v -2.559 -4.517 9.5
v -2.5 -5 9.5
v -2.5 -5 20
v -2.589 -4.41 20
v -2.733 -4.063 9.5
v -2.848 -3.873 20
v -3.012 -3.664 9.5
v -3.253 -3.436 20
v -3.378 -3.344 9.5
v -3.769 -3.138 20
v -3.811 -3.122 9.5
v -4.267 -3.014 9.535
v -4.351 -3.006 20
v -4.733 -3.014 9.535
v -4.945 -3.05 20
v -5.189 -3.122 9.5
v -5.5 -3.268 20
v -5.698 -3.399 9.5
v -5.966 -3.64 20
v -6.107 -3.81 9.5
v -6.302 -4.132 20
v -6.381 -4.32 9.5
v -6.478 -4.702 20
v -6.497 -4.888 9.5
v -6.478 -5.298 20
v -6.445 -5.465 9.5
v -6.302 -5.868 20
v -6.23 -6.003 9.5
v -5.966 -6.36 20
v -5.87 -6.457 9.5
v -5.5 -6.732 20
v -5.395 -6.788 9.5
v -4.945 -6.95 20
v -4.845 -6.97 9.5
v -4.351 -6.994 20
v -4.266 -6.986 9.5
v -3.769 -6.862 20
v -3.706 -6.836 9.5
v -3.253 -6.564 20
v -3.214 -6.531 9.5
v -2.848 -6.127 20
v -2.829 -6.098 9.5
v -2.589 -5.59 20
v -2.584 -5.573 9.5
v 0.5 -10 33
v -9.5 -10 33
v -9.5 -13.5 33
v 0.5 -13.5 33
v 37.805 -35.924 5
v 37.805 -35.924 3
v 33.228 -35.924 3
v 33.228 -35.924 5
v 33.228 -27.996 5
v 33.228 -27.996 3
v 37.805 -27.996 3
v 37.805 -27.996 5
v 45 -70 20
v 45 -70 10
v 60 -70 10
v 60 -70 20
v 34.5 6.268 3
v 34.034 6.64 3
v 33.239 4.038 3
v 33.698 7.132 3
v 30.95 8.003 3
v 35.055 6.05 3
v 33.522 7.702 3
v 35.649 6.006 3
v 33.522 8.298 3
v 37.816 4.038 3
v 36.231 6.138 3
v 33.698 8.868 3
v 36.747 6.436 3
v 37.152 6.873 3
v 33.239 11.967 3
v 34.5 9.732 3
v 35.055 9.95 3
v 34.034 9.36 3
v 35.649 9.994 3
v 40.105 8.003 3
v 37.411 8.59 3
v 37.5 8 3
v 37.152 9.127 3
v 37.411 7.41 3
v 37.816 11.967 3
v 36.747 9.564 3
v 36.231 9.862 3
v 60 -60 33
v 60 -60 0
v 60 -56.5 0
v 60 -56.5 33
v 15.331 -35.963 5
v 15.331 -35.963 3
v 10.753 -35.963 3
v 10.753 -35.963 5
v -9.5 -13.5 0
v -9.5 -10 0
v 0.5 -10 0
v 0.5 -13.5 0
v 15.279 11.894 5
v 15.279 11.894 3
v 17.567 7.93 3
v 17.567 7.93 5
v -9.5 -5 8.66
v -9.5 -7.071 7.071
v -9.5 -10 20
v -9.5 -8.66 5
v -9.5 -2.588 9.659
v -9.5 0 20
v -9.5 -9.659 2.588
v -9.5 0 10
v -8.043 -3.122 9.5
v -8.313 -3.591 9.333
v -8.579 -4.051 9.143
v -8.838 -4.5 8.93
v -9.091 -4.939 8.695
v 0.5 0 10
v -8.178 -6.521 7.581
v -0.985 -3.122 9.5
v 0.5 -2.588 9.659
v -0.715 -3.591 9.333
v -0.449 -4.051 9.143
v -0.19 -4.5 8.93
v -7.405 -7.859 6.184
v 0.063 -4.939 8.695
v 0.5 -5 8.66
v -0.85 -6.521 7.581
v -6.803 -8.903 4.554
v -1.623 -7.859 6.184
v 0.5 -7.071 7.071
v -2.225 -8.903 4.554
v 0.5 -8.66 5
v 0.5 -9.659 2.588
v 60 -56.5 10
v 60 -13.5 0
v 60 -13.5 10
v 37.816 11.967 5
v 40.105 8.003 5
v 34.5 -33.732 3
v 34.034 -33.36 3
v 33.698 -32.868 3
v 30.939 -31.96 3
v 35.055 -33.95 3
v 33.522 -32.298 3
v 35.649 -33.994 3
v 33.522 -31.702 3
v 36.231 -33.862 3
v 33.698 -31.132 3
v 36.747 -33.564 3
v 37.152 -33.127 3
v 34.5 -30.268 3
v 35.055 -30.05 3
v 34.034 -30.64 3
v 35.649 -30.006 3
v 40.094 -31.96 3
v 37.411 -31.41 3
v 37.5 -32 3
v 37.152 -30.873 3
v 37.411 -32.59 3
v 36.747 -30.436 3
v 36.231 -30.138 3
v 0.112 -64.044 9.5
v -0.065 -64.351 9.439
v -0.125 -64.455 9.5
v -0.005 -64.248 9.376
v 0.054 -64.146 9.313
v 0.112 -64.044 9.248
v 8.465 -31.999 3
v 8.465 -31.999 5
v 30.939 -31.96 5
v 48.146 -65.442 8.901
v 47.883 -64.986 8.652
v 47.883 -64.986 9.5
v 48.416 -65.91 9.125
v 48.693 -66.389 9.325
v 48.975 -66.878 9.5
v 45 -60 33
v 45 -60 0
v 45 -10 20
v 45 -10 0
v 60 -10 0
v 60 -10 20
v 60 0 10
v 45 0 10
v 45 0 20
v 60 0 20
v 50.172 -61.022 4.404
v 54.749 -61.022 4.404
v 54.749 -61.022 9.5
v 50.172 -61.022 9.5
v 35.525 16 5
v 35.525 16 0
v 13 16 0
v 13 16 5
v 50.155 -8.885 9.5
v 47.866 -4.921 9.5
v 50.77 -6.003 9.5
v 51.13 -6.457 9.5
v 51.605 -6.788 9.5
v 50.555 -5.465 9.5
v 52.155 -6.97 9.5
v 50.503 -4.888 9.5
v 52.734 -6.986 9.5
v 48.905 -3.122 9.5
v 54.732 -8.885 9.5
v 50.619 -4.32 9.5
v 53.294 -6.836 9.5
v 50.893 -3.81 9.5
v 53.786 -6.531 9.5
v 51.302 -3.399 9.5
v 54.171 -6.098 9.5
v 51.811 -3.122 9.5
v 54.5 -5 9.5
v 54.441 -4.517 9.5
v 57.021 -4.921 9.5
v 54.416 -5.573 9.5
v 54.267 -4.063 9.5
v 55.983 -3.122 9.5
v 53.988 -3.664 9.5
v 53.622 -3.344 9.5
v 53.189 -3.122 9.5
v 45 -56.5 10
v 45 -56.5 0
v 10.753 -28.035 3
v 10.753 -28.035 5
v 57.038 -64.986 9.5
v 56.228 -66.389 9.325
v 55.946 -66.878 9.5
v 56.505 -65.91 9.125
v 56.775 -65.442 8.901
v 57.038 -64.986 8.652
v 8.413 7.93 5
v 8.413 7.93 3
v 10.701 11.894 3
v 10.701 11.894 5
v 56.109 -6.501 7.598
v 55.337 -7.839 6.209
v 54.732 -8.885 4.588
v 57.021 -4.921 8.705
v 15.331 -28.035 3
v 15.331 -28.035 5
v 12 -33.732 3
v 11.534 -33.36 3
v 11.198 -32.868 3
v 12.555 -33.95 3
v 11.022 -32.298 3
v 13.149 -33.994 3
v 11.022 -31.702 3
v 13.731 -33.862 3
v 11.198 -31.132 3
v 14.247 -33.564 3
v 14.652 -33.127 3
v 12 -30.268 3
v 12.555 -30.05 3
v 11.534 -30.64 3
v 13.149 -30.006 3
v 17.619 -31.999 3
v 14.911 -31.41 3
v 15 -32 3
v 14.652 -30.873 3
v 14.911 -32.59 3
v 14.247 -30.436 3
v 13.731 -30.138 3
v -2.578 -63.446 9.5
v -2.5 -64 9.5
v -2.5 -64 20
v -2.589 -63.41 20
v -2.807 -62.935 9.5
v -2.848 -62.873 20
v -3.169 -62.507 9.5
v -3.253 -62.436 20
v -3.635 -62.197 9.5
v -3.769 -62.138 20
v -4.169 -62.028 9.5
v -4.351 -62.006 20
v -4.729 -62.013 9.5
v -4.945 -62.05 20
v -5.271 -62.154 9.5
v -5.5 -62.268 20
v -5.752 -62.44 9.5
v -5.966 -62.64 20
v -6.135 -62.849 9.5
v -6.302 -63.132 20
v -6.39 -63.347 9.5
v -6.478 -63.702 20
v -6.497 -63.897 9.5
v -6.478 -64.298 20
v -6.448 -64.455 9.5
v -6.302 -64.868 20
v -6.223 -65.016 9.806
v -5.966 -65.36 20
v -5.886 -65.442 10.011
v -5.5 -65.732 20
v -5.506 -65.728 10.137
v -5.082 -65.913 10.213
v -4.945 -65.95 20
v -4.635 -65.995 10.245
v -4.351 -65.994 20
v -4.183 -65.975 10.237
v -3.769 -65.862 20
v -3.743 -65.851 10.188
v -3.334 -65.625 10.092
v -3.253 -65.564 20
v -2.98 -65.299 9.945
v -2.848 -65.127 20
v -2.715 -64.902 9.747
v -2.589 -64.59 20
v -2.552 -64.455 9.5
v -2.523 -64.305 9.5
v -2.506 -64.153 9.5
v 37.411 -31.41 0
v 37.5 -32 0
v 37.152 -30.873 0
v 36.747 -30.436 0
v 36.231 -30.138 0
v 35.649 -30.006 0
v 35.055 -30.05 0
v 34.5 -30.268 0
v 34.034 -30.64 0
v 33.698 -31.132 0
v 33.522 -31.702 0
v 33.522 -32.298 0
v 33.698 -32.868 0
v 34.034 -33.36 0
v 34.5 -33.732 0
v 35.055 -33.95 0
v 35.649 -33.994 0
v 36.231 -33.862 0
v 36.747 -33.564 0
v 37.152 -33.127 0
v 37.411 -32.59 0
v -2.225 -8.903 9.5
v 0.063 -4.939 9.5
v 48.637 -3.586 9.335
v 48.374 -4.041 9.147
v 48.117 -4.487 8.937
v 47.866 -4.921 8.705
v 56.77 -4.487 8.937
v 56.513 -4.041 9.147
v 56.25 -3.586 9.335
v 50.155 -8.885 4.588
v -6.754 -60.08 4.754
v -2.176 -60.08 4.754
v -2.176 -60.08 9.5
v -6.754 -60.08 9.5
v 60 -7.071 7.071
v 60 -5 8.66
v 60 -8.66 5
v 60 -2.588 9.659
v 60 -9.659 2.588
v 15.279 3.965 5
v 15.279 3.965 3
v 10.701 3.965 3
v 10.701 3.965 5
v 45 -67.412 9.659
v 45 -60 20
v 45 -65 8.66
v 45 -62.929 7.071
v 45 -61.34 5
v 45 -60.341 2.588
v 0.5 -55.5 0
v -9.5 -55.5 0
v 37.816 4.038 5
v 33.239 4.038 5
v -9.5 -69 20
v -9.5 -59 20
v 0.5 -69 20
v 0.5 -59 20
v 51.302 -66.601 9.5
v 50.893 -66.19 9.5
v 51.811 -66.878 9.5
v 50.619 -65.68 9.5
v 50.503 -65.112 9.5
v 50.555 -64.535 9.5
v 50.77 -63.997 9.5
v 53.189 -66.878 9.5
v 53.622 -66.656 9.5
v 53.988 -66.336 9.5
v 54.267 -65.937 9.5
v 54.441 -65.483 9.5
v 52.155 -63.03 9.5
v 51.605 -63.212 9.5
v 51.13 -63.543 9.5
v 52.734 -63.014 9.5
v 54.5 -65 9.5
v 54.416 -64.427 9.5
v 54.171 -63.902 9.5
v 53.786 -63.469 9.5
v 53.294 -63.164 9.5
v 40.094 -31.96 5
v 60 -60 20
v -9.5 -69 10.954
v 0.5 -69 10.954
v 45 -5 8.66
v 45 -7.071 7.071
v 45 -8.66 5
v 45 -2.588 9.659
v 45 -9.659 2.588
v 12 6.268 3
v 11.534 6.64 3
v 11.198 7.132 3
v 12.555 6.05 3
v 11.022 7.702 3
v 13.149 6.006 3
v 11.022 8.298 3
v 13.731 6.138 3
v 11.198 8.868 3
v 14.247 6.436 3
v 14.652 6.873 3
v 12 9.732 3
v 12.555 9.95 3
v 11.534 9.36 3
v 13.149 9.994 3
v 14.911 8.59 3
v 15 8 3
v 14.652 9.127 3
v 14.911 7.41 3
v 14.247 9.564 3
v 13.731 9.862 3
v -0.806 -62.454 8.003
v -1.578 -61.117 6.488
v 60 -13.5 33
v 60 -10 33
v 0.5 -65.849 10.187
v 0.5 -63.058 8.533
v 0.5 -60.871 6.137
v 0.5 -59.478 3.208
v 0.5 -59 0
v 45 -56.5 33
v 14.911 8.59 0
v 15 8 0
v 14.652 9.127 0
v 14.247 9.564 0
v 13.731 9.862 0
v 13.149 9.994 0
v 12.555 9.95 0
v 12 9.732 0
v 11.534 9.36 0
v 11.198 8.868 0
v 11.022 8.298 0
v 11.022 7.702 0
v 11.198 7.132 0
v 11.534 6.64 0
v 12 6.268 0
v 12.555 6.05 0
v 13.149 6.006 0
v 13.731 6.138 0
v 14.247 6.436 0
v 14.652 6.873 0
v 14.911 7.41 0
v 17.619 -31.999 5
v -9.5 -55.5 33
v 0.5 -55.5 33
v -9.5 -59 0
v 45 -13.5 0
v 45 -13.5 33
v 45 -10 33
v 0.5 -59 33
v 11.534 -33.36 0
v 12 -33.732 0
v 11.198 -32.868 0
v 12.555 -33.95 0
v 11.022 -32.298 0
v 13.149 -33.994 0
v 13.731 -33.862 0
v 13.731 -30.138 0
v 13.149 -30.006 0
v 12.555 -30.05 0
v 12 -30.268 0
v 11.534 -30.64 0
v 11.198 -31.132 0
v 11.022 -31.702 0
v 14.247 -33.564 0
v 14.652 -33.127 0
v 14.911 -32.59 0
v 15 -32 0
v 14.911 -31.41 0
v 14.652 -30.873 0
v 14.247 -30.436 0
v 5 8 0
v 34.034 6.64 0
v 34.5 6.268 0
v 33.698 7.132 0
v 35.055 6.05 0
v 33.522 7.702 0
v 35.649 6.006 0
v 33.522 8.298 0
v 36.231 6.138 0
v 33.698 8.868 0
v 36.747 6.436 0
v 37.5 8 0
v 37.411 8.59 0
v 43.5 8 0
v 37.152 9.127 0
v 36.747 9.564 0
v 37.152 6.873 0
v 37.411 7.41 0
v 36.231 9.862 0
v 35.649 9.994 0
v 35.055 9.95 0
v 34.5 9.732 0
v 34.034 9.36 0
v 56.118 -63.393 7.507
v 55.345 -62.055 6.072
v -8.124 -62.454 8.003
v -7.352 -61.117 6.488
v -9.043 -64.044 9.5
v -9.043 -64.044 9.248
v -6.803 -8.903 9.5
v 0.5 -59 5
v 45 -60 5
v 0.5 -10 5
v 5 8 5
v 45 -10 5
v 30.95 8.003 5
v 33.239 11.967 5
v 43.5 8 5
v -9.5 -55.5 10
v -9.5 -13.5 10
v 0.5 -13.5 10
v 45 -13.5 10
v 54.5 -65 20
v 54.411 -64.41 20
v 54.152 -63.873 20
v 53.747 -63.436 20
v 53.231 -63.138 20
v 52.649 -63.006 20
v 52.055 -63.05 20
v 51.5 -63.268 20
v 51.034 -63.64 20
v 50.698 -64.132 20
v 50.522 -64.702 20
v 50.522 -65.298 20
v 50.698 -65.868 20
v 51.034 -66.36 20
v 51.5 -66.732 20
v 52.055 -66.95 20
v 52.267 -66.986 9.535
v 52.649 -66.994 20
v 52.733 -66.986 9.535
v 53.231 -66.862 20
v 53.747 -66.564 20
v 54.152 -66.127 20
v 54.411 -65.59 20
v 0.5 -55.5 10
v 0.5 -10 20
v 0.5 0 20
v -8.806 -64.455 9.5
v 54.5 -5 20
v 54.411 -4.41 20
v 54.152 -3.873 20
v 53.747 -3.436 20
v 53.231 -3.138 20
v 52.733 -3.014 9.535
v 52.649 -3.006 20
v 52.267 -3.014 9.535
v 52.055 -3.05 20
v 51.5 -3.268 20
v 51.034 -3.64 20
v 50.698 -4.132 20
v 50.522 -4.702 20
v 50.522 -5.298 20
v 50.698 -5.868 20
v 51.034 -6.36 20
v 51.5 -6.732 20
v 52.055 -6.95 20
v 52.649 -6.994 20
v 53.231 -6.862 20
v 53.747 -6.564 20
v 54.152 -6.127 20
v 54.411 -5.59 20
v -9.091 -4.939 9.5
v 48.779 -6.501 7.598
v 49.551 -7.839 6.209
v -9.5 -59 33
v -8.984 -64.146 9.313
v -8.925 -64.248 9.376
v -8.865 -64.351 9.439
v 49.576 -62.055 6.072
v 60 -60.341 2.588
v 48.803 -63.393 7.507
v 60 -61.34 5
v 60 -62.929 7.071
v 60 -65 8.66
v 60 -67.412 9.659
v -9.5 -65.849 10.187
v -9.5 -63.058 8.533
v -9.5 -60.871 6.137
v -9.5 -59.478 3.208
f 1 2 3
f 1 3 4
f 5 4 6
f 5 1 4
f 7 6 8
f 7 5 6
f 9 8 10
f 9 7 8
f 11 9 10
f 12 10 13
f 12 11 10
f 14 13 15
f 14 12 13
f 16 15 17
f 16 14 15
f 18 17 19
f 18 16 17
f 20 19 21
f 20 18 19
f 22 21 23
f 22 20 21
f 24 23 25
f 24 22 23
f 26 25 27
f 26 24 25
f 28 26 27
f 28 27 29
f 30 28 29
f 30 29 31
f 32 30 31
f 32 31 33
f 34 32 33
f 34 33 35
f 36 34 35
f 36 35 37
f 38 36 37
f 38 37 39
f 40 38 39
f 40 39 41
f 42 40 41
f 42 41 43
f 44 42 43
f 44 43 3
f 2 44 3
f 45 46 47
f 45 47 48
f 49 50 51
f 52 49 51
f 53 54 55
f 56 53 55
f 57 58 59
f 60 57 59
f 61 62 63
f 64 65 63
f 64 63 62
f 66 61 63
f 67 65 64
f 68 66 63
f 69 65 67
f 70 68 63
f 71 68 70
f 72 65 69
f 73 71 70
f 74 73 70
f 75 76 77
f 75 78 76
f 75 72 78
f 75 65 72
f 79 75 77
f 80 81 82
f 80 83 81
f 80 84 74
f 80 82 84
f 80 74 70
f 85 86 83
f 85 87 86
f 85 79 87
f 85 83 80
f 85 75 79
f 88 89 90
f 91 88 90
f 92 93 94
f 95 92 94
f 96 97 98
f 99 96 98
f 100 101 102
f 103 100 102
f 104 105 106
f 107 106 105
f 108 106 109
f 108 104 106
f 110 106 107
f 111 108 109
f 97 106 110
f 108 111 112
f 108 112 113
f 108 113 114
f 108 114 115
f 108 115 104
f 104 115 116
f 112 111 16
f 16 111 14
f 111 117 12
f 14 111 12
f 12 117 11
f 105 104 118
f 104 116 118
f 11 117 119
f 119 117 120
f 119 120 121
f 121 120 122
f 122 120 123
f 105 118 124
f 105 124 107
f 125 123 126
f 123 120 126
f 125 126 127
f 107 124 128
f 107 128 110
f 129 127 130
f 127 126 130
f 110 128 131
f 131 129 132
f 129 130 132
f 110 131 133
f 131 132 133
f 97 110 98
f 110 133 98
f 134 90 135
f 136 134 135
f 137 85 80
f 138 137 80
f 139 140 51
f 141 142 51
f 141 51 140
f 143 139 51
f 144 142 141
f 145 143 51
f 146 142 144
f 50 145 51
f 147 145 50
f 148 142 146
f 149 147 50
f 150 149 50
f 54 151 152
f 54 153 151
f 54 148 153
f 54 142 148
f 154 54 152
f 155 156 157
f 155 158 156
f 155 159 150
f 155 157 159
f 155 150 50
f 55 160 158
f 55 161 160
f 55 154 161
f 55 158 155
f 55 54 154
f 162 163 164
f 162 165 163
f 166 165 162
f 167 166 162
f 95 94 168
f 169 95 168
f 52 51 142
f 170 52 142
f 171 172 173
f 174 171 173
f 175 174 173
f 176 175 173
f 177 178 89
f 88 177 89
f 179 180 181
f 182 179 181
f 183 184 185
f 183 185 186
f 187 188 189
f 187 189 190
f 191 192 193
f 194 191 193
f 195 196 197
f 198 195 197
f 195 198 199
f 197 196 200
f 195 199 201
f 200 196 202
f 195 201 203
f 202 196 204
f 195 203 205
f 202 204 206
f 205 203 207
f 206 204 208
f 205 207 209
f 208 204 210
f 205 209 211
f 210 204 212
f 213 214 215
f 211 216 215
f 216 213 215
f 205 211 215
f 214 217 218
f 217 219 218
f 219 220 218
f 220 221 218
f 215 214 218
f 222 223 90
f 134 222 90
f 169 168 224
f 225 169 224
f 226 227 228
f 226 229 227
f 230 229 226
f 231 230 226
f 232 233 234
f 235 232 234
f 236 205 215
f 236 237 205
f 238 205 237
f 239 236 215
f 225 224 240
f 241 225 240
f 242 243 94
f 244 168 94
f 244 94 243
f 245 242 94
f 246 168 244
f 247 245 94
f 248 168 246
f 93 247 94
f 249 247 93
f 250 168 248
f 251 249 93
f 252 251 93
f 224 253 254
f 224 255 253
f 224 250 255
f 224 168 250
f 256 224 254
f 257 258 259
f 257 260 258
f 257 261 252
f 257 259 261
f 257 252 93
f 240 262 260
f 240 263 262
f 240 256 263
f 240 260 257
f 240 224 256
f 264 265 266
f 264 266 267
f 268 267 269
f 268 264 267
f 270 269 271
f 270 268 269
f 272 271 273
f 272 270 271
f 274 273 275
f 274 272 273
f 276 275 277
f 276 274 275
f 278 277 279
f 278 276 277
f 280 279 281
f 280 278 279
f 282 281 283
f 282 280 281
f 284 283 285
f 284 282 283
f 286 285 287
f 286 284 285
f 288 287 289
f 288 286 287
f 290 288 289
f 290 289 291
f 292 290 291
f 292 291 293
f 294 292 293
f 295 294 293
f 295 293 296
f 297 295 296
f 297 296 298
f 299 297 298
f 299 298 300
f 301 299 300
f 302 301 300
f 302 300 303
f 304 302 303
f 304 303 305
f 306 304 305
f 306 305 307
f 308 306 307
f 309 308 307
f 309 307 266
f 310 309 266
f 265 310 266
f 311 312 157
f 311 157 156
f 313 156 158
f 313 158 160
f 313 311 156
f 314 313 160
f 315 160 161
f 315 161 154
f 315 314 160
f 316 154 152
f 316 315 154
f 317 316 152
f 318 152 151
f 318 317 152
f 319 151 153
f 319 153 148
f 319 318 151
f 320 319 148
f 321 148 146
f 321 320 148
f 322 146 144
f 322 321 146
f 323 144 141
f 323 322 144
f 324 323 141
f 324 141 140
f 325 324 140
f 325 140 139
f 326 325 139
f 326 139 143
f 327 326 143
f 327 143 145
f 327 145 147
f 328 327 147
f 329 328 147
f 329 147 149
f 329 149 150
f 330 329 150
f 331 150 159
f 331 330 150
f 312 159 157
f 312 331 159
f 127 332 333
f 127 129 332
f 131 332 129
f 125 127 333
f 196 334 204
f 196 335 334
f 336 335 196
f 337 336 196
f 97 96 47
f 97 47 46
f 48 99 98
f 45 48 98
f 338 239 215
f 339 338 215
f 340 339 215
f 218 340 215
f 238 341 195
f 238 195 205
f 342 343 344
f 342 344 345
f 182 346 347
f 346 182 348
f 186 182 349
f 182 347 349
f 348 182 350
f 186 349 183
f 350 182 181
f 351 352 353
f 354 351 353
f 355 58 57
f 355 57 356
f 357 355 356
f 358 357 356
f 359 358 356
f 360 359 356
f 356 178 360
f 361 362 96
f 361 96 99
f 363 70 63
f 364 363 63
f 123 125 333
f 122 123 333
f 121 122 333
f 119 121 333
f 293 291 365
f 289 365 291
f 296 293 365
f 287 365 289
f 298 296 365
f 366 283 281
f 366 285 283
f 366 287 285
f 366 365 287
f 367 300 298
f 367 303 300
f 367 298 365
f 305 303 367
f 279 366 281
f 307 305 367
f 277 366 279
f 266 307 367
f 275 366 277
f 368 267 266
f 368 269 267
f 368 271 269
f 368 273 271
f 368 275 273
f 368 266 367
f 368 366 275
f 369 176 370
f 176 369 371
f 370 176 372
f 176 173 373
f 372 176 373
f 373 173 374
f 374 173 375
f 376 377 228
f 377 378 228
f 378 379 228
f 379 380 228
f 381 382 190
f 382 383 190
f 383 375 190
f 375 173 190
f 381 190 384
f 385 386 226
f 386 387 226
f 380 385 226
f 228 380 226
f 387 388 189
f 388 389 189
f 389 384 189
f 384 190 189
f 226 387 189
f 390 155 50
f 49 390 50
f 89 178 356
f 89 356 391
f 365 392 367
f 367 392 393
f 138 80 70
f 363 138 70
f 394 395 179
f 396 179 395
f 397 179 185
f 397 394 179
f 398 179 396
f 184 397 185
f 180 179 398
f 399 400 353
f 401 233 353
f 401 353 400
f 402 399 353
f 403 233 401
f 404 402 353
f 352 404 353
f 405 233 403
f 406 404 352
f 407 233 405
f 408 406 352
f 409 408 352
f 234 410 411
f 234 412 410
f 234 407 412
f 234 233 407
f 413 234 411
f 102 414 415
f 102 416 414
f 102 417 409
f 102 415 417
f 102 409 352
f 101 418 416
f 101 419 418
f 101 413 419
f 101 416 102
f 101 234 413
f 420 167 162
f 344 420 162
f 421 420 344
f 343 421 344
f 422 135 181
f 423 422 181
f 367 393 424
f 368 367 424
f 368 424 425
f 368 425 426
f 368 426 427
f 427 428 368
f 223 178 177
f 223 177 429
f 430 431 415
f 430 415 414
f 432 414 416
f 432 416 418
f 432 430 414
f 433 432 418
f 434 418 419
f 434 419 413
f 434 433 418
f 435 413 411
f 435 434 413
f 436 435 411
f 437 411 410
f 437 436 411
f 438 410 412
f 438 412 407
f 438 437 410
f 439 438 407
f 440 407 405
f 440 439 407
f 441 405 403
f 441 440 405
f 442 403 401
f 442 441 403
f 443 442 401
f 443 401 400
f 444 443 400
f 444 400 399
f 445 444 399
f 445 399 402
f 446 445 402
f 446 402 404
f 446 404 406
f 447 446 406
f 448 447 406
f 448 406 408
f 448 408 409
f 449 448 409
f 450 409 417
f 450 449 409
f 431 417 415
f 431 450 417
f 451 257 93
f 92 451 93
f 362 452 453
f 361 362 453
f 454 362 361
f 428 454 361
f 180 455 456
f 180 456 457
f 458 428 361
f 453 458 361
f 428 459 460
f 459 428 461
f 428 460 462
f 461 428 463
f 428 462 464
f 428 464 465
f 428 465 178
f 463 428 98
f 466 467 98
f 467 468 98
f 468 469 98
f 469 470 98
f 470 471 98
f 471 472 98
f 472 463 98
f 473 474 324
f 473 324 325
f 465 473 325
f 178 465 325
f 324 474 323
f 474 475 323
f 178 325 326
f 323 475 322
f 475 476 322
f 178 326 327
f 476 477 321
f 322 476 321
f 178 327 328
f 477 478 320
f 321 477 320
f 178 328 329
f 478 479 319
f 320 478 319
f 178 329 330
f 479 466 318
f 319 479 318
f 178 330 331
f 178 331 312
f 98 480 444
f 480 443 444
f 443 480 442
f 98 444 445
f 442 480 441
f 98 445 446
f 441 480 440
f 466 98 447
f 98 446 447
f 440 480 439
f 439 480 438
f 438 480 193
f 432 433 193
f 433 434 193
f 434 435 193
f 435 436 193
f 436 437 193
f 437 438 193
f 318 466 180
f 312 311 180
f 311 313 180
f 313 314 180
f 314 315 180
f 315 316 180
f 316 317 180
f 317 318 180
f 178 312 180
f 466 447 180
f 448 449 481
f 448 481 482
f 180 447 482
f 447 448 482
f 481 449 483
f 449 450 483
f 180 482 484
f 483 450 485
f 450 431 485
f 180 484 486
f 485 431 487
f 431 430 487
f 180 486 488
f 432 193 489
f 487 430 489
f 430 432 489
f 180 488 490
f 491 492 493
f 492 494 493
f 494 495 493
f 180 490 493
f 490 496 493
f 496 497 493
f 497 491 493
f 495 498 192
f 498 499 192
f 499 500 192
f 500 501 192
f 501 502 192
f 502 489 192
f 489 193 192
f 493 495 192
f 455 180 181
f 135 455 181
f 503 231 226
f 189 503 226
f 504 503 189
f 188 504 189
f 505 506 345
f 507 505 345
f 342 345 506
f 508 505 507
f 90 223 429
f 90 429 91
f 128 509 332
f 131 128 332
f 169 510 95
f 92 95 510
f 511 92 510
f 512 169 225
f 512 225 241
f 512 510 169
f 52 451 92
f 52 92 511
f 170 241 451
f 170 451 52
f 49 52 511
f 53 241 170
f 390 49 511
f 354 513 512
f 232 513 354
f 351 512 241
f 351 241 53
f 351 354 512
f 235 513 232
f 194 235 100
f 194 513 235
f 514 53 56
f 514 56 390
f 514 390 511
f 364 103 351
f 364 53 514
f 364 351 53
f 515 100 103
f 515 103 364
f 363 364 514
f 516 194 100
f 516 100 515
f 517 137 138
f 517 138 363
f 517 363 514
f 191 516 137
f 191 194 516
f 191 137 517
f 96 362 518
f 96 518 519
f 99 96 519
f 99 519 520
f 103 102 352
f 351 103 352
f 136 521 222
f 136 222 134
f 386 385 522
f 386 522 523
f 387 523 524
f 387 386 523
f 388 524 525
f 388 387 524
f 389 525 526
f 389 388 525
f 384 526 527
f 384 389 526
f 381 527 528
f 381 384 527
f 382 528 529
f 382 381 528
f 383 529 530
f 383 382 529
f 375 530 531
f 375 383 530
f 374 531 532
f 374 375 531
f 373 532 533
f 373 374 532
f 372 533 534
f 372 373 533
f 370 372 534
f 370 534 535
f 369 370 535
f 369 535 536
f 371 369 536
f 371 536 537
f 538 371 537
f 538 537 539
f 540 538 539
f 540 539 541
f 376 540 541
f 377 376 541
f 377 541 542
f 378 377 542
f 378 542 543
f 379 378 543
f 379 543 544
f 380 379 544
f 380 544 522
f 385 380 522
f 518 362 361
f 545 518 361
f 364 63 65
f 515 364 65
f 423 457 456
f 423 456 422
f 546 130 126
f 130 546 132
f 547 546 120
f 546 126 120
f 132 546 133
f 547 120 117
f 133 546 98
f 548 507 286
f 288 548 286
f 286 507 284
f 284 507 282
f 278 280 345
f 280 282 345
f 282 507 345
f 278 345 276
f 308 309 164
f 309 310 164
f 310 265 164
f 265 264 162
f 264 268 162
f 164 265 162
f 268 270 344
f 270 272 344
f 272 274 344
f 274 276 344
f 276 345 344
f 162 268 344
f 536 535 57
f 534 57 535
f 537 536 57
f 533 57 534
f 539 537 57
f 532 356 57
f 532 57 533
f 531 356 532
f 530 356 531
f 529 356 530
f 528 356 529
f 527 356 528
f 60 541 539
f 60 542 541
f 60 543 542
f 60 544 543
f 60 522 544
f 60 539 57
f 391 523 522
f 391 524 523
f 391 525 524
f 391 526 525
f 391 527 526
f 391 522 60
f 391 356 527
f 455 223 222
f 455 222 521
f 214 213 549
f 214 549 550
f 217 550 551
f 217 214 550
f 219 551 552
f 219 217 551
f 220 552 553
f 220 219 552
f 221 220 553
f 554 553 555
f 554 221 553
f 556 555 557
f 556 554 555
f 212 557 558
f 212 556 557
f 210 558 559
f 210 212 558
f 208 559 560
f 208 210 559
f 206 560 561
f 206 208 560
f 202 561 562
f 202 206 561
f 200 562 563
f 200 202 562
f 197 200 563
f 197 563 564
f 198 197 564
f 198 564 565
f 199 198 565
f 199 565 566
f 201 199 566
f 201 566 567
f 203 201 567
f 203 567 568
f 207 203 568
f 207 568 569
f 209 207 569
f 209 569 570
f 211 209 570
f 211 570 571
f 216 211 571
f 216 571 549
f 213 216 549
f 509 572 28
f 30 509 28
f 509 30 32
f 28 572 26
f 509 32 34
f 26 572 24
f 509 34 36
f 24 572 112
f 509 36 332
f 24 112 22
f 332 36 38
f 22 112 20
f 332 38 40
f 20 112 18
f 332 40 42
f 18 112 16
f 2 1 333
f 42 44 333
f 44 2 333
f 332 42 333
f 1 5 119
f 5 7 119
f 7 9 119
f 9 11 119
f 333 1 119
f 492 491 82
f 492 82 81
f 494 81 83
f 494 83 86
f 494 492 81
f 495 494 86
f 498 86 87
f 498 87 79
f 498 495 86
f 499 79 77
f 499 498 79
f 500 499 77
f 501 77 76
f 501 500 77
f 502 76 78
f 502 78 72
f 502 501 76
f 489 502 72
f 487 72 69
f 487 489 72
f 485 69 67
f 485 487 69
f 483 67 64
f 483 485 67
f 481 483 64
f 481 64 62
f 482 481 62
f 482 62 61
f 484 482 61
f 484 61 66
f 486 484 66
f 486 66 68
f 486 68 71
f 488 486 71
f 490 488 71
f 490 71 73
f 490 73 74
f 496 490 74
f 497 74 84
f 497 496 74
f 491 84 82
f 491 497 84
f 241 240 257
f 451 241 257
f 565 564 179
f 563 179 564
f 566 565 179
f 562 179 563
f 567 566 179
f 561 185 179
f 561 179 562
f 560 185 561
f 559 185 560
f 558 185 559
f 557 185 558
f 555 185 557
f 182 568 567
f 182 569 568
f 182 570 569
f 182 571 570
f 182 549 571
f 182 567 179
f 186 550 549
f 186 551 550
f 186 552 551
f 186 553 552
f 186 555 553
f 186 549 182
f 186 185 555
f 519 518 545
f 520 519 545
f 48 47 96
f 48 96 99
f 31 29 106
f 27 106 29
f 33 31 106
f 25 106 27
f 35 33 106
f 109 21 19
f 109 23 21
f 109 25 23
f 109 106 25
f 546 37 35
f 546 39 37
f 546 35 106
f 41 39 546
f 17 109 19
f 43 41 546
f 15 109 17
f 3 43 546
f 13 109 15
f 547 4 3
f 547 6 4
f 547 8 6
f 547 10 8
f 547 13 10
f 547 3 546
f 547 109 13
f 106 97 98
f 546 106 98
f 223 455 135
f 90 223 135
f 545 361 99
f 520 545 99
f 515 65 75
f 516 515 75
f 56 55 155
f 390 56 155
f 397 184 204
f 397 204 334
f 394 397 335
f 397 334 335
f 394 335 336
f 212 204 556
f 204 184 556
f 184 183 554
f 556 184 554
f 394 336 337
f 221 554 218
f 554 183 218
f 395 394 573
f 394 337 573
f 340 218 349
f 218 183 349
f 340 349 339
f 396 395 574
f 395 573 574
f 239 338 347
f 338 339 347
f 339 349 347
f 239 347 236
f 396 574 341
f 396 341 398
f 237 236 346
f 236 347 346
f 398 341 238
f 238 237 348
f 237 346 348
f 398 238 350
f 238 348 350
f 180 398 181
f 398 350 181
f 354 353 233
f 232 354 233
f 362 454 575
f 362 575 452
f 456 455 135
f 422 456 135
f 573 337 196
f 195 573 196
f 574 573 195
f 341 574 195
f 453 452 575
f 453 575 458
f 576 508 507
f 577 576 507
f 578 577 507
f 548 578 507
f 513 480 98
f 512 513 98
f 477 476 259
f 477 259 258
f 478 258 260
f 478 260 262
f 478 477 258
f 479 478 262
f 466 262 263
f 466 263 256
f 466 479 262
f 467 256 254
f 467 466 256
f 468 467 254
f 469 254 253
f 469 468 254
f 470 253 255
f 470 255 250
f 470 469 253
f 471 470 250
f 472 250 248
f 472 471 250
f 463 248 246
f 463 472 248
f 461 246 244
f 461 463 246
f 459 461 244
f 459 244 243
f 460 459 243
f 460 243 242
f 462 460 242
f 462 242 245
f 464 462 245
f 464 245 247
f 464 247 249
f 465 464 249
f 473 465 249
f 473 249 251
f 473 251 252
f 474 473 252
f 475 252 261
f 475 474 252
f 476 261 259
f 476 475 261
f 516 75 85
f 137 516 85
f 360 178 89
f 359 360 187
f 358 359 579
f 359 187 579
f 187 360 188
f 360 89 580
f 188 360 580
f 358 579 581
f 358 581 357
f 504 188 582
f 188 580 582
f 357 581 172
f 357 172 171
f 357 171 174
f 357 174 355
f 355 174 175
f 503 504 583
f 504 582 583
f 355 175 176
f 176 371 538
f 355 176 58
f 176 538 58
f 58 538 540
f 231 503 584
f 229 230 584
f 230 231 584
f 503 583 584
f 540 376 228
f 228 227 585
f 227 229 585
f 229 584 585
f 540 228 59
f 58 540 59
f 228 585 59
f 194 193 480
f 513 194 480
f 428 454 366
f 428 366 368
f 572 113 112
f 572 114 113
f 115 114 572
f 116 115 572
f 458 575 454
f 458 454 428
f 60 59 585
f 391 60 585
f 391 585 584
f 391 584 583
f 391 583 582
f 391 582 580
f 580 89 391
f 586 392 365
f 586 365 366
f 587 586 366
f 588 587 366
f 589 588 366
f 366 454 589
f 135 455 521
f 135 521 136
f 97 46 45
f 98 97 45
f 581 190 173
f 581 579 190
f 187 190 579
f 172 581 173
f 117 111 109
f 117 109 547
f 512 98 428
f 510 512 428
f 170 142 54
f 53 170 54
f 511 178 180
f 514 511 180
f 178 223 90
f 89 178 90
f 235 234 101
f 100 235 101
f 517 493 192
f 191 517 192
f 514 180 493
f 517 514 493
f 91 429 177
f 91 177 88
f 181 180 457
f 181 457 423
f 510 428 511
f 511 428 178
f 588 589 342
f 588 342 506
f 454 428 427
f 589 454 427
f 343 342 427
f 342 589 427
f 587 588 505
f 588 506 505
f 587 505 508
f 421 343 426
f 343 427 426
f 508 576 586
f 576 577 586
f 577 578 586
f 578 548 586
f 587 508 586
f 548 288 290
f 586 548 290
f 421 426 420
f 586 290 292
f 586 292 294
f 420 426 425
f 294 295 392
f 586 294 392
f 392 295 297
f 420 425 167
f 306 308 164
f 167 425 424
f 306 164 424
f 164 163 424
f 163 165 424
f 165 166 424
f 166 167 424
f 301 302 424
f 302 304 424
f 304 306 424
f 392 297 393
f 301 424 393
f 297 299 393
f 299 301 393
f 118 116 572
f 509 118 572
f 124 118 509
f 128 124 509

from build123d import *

# Parameters (mm, degrees)
F0_W     = 15
F0_H     = 43
F1_DEPTH = 10
F0_W_2   = 10
F0_H_2   = 42
F0_H_3   = 3.5
F2_DEPTH = 33
F0_H_4   = 10
F0_R     = 2
F3_DEPTH = 20
F4_DEPTH = 9.5
F7_DEPTH = 5
F8_DEPTH = 3


with BuildPart() as f1:
    # F0 (on Top) → F1 (new body)
    with BuildSketch(Plane.XY):
        with Locations((52.5, -35)):
            Rectangle(F0_W, F0_H)
    extrude(amount=F1_DEPTH)


with BuildPart() as f1b:
    # F0 (on Top) → F1, piece 2 (new body)
    with BuildSketch(Plane.XY):
        with Locations((-4.5, -34.5)):
            Rectangle(F0_W_2, F0_H_2)
    extrude(amount=F1_DEPTH)


with BuildPart() as f2:
    # F0 (on Top) → F2 (new body)
    with BuildSketch(Plane.XY):
        with Locations((-4.5, -57.25)):
            Rectangle(F0_W_2, F0_H_3)
    extrude(amount=F2_DEPTH)


with BuildPart() as f2b:
    # F0 (on Top) → F2, piece 2 (new body)
    with BuildSketch(Plane.XY):
        with Locations((-4.5, -11.75)):
            Rectangle(F0_W_2, F0_H_3)
    extrude(amount=F2_DEPTH)


with BuildPart() as f2c:
    # F0 (on Top) → F2, piece 3 (new body)
    with BuildSketch(Plane.XY):
        with Locations((52.5, -11.75)):
            Rectangle(F0_W, F0_H_3)
    extrude(amount=F2_DEPTH)


with BuildPart() as f2d:
    # F0 (on Top) → F2, piece 4 (new body)
    with BuildSketch(Plane.XY):
        with Locations((52.5, -58.25)):
            Rectangle(F0_W, F0_H_3)
    extrude(amount=F2_DEPTH)


with BuildPart() as f3:
    # F0 (on Top) → F3 (new body)
    with BuildSketch(Plane.XY):
        with Locations((52.5, -65)):
            Rectangle(F0_W, F0_H_4)
        Polygon((50.171872402, -68.950330558), (47.8831972674, -64.9862289429), (50.171872402, -61.0221273277), (54.7492226712, -61.0221273277), (57.0378978058, -64.9862289429), (54.7492226712, -68.950330558), align=None, mode=Mode.SUBTRACT)
        Polygon((50.171872402, -61.0221273277), (47.8831972674, -64.9862289429), (50.171872402, -68.950330558), (54.7492226712, -68.950330558), (57.0378978058, -64.9862289429), (54.7492226712, -61.0221273277), align=None)
        with Locations((52.5, -65)):
            Circle(F0_R, mode=Mode.SUBTRACT)
    extrude(amount=F3_DEPTH)


with BuildPart() as f3b:
    # F0 (on Top) → F3, piece 2 (new body)
    with BuildSketch(Plane.XY):
        with Locations((-4.5, -64)):
            Rectangle(F0_W_2, F0_H_4)
        Polygon((-6.7538499958, -68.0085920717), (-9.0425251304, -64.0444904566), (-6.7538499958, -60.0803888414), (-2.1764997267, -60.0803888414), (0.1121754079, -64.0444904566), (-2.1764997267, -68.0085920717), align=None, mode=Mode.SUBTRACT)
        Polygon((-6.7538499958, -60.0803888414), (-9.0425251304, -64.0444904566), (-6.7538499958, -68.0085920717), (-2.1764997267, -68.0085920717), (0.1121754079, -64.0444904566), (-2.1764997267, -60.0803888414), align=None)
        with Locations((-4.5, -64)):
            Circle(F0_R, mode=Mode.SUBTRACT)
    extrude(amount=F3_DEPTH)


with BuildPart() as f3c:
    # F0 (on Top) → F3, piece 3 (new body)
    with BuildSketch(Plane.XY):
        with Locations((-4.5, -5)):
            Rectangle(F0_W_2, F0_H_4)
        Polygon((-6.8026797041, -8.9027622703), (-9.0913548387, -4.9386606552), (-6.8026797041, -0.97455904), (-2.2253294349, -0.97455904), (0.0633456997, -4.9386606552), (-2.2253294349, -8.9027622703), align=None, mode=Mode.SUBTRACT)
        Polygon((-6.8026797041, -0.97455904), (-9.0913548387, -4.9386606552), (-6.8026797041, -8.9027622703), (-2.2253294349, -8.9027622703), (0.0633456997, -4.9386606552), (-2.2253294349, -0.97455904), align=None)
        with Locations((-4.5, -5)):
            Circle(F0_R, mode=Mode.SUBTRACT)
    extrude(amount=F3_DEPTH)


with BuildPart() as f3d:
    # F0 (on Top) → F3, piece 4 (new body)
    with BuildSketch(Plane.XY):
        with Locations((52.5, -5)):
            Rectangle(F0_W, F0_H_4)
        Polygon((50.1551458486, -8.8854019519), (47.866470714, -4.9213003367), (50.1551458486, -0.9571987216), (54.7324961178, -0.9571987216), (57.0211712524, -4.9213003367), (54.7324961178, -8.8854019519), align=None, mode=Mode.SUBTRACT)
        Polygon((50.1551458486, -0.9571987216), (47.866470714, -4.9213003367), (50.1551458486, -8.8854019519), (54.7324961178, -8.8854019519), (57.0211712524, -4.9213003367), (54.7324961178, -0.9571987216), align=None)
        with Locations((52.5, -5)):
            Circle(F0_R, mode=Mode.SUBTRACT)
    extrude(amount=F3_DEPTH)


with BuildPart() as f4_tool:
    # F0 (on Top) → F4 (new body)
    with BuildSketch(Plane.XY):
        Polygon((50.171872402, -61.0221273277), (47.8831972674, -64.9862289429), (50.171872402, -68.950330558), (54.7492226712, -68.950330558), (57.0378978058, -64.9862289429), (54.7492226712, -61.0221273277), align=None)
        with Locations((52.5, -65)):
            Circle(F0_R, mode=Mode.SUBTRACT)
        Polygon((50.1551458486, -0.9571987216), (47.866470714, -4.9213003367), (50.1551458486, -8.8854019519), (54.7324961178, -8.8854019519), (57.0211712524, -4.9213003367), (54.7324961178, -0.9571987216), align=None)
        with Locations((52.5, -5)):
            Circle(F0_R, mode=Mode.SUBTRACT)
        Polygon((-6.7538499958, -60.0803888414), (-9.0425251304, -64.0444904566), (-6.7538499958, -68.0085920717), (-2.1764997267, -68.0085920717), (0.1121754079, -64.0444904566), (-2.1764997267, -60.0803888414), align=None)
        with Locations((-4.5, -64)):
            Circle(F0_R, mode=Mode.SUBTRACT)
        Polygon((-6.8026797041, -0.97455904), (-9.0913548387, -4.9386606552), (-6.8026797041, -8.9027622703), (-2.2253294349, -8.9027622703), (0.0633456997, -4.9386606552), (-2.2253294349, -0.97455904), align=None)
        with Locations((-4.5, -5)):
            Circle(F0_R, mode=Mode.SUBTRACT)
    extrude(amount=F4_DEPTH)


with BuildPart() as f3_1:
    add(f3.part)

    # F4: cut by f4_tool
    add(f4_tool.part, mode=Mode.SUBTRACT)


with BuildPart() as f3b_1:
    add(f3b.part)

    # F4: cut by f4_tool
    add(f4_tool.part, mode=Mode.SUBTRACT)


with BuildPart() as f3c_1:
    add(f3c.part)

    # F4: cut by f4_tool
    add(f4_tool.part, mode=Mode.SUBTRACT)


with BuildPart() as f3d_1:
    add(f3d.part)

    # F4: cut by f4_tool
    add(f4_tool.part, mode=Mode.SUBTRACT)


with BuildPart() as f5_tool:
    # F0 (on Top) → F5 (revolve)
    with BuildSketch(Plane.XY):
        with Locations((52.5, -65)):
            Rectangle(F0_W, F0_H_4)
        Polygon((50.171872402, -68.950330558), (47.8831972674, -64.9862289429), (50.171872402, -61.0221273277), (54.7492226712, -61.0221273277), (57.0378978058, -64.9862289429), (54.7492226712, -68.950330558), align=None, mode=Mode.SUBTRACT)
        Polygon((50.171872402, -61.0221273277), (47.8831972674, -64.9862289429), (50.171872402, -68.950330558), (54.7492226712, -68.950330558), (57.0378978058, -64.9862289429), (54.7492226712, -61.0221273277), align=None)
        with Locations((52.5, -65)):
            Circle(F0_R, mode=Mode.SUBTRACT)
        with Locations((52.5, -65)):
            Circle(F0_R)
        with Locations((-4.5, -64)):
            Rectangle(F0_W_2, F0_H_4)
        Polygon((-6.7538499958, -68.0085920717), (-9.0425251304, -64.0444904566), (-6.7538499958, -60.0803888414), (-2.1764997267, -60.0803888414), (0.1121754079, -64.0444904566), (-2.1764997267, -68.0085920717), align=None, mode=Mode.SUBTRACT)
        Polygon((-6.7538499958, -60.0803888414), (-9.0425251304, -64.0444904566), (-6.7538499958, -68.0085920717), (-2.1764997267, -68.0085920717), (0.1121754079, -64.0444904566), (-2.1764997267, -60.0803888414), align=None)
        with Locations((-4.5, -64)):
            Circle(F0_R, mode=Mode.SUBTRACT)
        with Locations((-4.5, -64)):
            Circle(F0_R)
    revolve(axis=Axis((52.5, -70, 0), (1, 0, 0)))


with BuildPart() as f3_2:
    add(f3_1.part)

    # F5: cut by f5_tool
    add(f5_tool.part, mode=Mode.SUBTRACT)


with BuildPart() as f3b_2:
    add(f3b_1.part)

    # F5: cut by f5_tool
    add(f5_tool.part, mode=Mode.SUBTRACT)


with BuildPart() as f6_tool:
    # F0 (on Top) → F6 (revolve)
    with BuildSketch(Plane.XY):
        with Locations((52.5, -5)):
            Rectangle(F0_W, F0_H_4)
        Polygon((50.1551458486, -8.8854019519), (47.866470714, -4.9213003367), (50.1551458486, -0.9571987216), (54.7324961178, -0.9571987216), (57.0211712524, -4.9213003367), (54.7324961178, -8.8854019519), align=None, mode=Mode.SUBTRACT)
        Polygon((50.1551458486, -0.9571987216), (47.866470714, -4.9213003367), (50.1551458486, -8.8854019519), (54.7324961178, -8.8854019519), (57.0211712524, -4.9213003367), (54.7324961178, -0.9571987216), align=None)
        with Locations((52.5, -5)):
            Circle(F0_R, mode=Mode.SUBTRACT)
        with Locations((52.5, -5)):
            Circle(F0_R)
        with Locations((-4.5, -5)):
            Rectangle(F0_W_2, F0_H_4)
        Polygon((-6.8026797041, -8.9027622703), (-9.0913548387, -4.9386606552), (-6.8026797041, -0.97455904), (-2.2253294349, -0.97455904), (0.0633456997, -4.9386606552), (-2.2253294349, -8.9027622703), align=None, mode=Mode.SUBTRACT)
        Polygon((-6.8026797041, -0.97455904), (-9.0913548387, -4.9386606552), (-6.8026797041, -8.9027622703), (-2.2253294349, -8.9027622703), (0.0633456997, -4.9386606552), (-2.2253294349, -0.97455904), align=None)
        with Locations((-4.5, -5)):
            Circle(F0_R, mode=Mode.SUBTRACT)
        with Locations((-4.5, -5)):
            Circle(F0_R)
    revolve(axis=Axis((52.5, 0, 0), (1, 0, 0)))


with BuildPart() as f3c_2:
    add(f3c_1.part)

    # F6: cut by f6_tool
    add(f6_tool.part, mode=Mode.SUBTRACT)


with BuildPart() as f3d_2:
    add(f3d_1.part)

    # F6: cut by f6_tool
    add(f6_tool.part, mode=Mode.SUBTRACT)


with BuildPart() as f7:
    # F0 (on Top) → F7 (new body)
    with BuildSketch(Plane.XY):
        Polygon((45, -13.5), (45, -10), (43.5, 8), (35.5252214486, 15.9999602423), (13, 16), (5, 8), (0.5, -10), (0.5, -13.5), (0.5, -55.5), (0.5, -59), (45, -60), (45, -56.5), align=None)
        Polygon((10.7534305551, -35.963216516), (8.4647554205, -31.9991149008), (10.7534305551, -28.0350132857), (15.3307808242, -28.0350132857), (17.6194559588, -31.9991149008), (15.3307808242, -35.963216516), align=None, mode=Mode.SUBTRACT)
        Polygon((33.2279967018, -35.9242164518), (30.9393215672, -31.9601148367), (33.2279967018, -27.9960132216), (37.805346971, -27.9960132216), (40.0940221056, -31.9601148367), (37.805346971, -35.9242164518), align=None, mode=Mode.SUBTRACT)
        Polygon((10.7013584473, 3.9654907782), (8.4126833127, 7.9295923933), (10.7013584473, 11.8936940085), (15.2787087164, 11.8936940085), (17.567383851, 7.9295923933), (15.2787087164, 3.9654907782), align=None, mode=Mode.SUBTRACT)
        Polygon((33.2386137791, 4.0384794597), (30.9499386445, 8.0025810748), (33.2386137791, 11.96668269), (37.8159640483, 11.96668269), (40.1046391829, 8.0025810748), (37.8159640483, 4.0384794597), align=None, mode=Mode.SUBTRACT)
    extrude(amount=F7_DEPTH)

    # F0 (on Top) → F8 (join)
    with BuildSketch(Plane.XY):
        Polygon((10.7534305551, -28.0350132857), (8.4647554205, -31.9991149008), (10.7534305551, -35.963216516), (15.3307808242, -35.963216516), (17.6194559588, -31.9991149008), (15.3307808242, -28.0350132857), align=None)
        with Locations((13, -32)):
            Circle(F0_R, mode=Mode.SUBTRACT)
        Polygon((33.2279967018, -27.9960132216), (30.9393215672, -31.9601148367), (33.2279967018, -35.9242164518), (37.805346971, -35.9242164518), (40.0940221056, -31.9601148367), (37.805346971, -27.9960132216), align=None)
        with Locations((35.5, -32)):
            Circle(F0_R, mode=Mode.SUBTRACT)
        Polygon((33.2386137791, 11.96668269), (30.9499386445, 8.0025810748), (33.2386137791, 4.0384794597), (37.8159640483, 4.0384794597), (40.1046391829, 8.0025810748), (37.8159640483, 11.96668269), align=None)
        with Locations((35.5, 8)):
            Circle(F0_R, mode=Mode.SUBTRACT)
        Polygon((10.7013584473, 11.8936940085), (8.4126833127, 7.9295923933), (10.7013584473, 3.9654907782), (15.2787087164, 3.9654907782), (17.567383851, 7.9295923933), (15.2787087164, 11.8936940085), align=None)
        with Locations((13, 8)):
            Circle(F0_R, mode=Mode.SUBTRACT)
    extrude(amount=F8_DEPTH)


solid = Compound([f1.part, f1b.part, f2.part, f2b.part, f2c.part, f2d.part, f3_2.part, f3b_2.part, f3c_2.part, f3d_2.part, f7.part])
